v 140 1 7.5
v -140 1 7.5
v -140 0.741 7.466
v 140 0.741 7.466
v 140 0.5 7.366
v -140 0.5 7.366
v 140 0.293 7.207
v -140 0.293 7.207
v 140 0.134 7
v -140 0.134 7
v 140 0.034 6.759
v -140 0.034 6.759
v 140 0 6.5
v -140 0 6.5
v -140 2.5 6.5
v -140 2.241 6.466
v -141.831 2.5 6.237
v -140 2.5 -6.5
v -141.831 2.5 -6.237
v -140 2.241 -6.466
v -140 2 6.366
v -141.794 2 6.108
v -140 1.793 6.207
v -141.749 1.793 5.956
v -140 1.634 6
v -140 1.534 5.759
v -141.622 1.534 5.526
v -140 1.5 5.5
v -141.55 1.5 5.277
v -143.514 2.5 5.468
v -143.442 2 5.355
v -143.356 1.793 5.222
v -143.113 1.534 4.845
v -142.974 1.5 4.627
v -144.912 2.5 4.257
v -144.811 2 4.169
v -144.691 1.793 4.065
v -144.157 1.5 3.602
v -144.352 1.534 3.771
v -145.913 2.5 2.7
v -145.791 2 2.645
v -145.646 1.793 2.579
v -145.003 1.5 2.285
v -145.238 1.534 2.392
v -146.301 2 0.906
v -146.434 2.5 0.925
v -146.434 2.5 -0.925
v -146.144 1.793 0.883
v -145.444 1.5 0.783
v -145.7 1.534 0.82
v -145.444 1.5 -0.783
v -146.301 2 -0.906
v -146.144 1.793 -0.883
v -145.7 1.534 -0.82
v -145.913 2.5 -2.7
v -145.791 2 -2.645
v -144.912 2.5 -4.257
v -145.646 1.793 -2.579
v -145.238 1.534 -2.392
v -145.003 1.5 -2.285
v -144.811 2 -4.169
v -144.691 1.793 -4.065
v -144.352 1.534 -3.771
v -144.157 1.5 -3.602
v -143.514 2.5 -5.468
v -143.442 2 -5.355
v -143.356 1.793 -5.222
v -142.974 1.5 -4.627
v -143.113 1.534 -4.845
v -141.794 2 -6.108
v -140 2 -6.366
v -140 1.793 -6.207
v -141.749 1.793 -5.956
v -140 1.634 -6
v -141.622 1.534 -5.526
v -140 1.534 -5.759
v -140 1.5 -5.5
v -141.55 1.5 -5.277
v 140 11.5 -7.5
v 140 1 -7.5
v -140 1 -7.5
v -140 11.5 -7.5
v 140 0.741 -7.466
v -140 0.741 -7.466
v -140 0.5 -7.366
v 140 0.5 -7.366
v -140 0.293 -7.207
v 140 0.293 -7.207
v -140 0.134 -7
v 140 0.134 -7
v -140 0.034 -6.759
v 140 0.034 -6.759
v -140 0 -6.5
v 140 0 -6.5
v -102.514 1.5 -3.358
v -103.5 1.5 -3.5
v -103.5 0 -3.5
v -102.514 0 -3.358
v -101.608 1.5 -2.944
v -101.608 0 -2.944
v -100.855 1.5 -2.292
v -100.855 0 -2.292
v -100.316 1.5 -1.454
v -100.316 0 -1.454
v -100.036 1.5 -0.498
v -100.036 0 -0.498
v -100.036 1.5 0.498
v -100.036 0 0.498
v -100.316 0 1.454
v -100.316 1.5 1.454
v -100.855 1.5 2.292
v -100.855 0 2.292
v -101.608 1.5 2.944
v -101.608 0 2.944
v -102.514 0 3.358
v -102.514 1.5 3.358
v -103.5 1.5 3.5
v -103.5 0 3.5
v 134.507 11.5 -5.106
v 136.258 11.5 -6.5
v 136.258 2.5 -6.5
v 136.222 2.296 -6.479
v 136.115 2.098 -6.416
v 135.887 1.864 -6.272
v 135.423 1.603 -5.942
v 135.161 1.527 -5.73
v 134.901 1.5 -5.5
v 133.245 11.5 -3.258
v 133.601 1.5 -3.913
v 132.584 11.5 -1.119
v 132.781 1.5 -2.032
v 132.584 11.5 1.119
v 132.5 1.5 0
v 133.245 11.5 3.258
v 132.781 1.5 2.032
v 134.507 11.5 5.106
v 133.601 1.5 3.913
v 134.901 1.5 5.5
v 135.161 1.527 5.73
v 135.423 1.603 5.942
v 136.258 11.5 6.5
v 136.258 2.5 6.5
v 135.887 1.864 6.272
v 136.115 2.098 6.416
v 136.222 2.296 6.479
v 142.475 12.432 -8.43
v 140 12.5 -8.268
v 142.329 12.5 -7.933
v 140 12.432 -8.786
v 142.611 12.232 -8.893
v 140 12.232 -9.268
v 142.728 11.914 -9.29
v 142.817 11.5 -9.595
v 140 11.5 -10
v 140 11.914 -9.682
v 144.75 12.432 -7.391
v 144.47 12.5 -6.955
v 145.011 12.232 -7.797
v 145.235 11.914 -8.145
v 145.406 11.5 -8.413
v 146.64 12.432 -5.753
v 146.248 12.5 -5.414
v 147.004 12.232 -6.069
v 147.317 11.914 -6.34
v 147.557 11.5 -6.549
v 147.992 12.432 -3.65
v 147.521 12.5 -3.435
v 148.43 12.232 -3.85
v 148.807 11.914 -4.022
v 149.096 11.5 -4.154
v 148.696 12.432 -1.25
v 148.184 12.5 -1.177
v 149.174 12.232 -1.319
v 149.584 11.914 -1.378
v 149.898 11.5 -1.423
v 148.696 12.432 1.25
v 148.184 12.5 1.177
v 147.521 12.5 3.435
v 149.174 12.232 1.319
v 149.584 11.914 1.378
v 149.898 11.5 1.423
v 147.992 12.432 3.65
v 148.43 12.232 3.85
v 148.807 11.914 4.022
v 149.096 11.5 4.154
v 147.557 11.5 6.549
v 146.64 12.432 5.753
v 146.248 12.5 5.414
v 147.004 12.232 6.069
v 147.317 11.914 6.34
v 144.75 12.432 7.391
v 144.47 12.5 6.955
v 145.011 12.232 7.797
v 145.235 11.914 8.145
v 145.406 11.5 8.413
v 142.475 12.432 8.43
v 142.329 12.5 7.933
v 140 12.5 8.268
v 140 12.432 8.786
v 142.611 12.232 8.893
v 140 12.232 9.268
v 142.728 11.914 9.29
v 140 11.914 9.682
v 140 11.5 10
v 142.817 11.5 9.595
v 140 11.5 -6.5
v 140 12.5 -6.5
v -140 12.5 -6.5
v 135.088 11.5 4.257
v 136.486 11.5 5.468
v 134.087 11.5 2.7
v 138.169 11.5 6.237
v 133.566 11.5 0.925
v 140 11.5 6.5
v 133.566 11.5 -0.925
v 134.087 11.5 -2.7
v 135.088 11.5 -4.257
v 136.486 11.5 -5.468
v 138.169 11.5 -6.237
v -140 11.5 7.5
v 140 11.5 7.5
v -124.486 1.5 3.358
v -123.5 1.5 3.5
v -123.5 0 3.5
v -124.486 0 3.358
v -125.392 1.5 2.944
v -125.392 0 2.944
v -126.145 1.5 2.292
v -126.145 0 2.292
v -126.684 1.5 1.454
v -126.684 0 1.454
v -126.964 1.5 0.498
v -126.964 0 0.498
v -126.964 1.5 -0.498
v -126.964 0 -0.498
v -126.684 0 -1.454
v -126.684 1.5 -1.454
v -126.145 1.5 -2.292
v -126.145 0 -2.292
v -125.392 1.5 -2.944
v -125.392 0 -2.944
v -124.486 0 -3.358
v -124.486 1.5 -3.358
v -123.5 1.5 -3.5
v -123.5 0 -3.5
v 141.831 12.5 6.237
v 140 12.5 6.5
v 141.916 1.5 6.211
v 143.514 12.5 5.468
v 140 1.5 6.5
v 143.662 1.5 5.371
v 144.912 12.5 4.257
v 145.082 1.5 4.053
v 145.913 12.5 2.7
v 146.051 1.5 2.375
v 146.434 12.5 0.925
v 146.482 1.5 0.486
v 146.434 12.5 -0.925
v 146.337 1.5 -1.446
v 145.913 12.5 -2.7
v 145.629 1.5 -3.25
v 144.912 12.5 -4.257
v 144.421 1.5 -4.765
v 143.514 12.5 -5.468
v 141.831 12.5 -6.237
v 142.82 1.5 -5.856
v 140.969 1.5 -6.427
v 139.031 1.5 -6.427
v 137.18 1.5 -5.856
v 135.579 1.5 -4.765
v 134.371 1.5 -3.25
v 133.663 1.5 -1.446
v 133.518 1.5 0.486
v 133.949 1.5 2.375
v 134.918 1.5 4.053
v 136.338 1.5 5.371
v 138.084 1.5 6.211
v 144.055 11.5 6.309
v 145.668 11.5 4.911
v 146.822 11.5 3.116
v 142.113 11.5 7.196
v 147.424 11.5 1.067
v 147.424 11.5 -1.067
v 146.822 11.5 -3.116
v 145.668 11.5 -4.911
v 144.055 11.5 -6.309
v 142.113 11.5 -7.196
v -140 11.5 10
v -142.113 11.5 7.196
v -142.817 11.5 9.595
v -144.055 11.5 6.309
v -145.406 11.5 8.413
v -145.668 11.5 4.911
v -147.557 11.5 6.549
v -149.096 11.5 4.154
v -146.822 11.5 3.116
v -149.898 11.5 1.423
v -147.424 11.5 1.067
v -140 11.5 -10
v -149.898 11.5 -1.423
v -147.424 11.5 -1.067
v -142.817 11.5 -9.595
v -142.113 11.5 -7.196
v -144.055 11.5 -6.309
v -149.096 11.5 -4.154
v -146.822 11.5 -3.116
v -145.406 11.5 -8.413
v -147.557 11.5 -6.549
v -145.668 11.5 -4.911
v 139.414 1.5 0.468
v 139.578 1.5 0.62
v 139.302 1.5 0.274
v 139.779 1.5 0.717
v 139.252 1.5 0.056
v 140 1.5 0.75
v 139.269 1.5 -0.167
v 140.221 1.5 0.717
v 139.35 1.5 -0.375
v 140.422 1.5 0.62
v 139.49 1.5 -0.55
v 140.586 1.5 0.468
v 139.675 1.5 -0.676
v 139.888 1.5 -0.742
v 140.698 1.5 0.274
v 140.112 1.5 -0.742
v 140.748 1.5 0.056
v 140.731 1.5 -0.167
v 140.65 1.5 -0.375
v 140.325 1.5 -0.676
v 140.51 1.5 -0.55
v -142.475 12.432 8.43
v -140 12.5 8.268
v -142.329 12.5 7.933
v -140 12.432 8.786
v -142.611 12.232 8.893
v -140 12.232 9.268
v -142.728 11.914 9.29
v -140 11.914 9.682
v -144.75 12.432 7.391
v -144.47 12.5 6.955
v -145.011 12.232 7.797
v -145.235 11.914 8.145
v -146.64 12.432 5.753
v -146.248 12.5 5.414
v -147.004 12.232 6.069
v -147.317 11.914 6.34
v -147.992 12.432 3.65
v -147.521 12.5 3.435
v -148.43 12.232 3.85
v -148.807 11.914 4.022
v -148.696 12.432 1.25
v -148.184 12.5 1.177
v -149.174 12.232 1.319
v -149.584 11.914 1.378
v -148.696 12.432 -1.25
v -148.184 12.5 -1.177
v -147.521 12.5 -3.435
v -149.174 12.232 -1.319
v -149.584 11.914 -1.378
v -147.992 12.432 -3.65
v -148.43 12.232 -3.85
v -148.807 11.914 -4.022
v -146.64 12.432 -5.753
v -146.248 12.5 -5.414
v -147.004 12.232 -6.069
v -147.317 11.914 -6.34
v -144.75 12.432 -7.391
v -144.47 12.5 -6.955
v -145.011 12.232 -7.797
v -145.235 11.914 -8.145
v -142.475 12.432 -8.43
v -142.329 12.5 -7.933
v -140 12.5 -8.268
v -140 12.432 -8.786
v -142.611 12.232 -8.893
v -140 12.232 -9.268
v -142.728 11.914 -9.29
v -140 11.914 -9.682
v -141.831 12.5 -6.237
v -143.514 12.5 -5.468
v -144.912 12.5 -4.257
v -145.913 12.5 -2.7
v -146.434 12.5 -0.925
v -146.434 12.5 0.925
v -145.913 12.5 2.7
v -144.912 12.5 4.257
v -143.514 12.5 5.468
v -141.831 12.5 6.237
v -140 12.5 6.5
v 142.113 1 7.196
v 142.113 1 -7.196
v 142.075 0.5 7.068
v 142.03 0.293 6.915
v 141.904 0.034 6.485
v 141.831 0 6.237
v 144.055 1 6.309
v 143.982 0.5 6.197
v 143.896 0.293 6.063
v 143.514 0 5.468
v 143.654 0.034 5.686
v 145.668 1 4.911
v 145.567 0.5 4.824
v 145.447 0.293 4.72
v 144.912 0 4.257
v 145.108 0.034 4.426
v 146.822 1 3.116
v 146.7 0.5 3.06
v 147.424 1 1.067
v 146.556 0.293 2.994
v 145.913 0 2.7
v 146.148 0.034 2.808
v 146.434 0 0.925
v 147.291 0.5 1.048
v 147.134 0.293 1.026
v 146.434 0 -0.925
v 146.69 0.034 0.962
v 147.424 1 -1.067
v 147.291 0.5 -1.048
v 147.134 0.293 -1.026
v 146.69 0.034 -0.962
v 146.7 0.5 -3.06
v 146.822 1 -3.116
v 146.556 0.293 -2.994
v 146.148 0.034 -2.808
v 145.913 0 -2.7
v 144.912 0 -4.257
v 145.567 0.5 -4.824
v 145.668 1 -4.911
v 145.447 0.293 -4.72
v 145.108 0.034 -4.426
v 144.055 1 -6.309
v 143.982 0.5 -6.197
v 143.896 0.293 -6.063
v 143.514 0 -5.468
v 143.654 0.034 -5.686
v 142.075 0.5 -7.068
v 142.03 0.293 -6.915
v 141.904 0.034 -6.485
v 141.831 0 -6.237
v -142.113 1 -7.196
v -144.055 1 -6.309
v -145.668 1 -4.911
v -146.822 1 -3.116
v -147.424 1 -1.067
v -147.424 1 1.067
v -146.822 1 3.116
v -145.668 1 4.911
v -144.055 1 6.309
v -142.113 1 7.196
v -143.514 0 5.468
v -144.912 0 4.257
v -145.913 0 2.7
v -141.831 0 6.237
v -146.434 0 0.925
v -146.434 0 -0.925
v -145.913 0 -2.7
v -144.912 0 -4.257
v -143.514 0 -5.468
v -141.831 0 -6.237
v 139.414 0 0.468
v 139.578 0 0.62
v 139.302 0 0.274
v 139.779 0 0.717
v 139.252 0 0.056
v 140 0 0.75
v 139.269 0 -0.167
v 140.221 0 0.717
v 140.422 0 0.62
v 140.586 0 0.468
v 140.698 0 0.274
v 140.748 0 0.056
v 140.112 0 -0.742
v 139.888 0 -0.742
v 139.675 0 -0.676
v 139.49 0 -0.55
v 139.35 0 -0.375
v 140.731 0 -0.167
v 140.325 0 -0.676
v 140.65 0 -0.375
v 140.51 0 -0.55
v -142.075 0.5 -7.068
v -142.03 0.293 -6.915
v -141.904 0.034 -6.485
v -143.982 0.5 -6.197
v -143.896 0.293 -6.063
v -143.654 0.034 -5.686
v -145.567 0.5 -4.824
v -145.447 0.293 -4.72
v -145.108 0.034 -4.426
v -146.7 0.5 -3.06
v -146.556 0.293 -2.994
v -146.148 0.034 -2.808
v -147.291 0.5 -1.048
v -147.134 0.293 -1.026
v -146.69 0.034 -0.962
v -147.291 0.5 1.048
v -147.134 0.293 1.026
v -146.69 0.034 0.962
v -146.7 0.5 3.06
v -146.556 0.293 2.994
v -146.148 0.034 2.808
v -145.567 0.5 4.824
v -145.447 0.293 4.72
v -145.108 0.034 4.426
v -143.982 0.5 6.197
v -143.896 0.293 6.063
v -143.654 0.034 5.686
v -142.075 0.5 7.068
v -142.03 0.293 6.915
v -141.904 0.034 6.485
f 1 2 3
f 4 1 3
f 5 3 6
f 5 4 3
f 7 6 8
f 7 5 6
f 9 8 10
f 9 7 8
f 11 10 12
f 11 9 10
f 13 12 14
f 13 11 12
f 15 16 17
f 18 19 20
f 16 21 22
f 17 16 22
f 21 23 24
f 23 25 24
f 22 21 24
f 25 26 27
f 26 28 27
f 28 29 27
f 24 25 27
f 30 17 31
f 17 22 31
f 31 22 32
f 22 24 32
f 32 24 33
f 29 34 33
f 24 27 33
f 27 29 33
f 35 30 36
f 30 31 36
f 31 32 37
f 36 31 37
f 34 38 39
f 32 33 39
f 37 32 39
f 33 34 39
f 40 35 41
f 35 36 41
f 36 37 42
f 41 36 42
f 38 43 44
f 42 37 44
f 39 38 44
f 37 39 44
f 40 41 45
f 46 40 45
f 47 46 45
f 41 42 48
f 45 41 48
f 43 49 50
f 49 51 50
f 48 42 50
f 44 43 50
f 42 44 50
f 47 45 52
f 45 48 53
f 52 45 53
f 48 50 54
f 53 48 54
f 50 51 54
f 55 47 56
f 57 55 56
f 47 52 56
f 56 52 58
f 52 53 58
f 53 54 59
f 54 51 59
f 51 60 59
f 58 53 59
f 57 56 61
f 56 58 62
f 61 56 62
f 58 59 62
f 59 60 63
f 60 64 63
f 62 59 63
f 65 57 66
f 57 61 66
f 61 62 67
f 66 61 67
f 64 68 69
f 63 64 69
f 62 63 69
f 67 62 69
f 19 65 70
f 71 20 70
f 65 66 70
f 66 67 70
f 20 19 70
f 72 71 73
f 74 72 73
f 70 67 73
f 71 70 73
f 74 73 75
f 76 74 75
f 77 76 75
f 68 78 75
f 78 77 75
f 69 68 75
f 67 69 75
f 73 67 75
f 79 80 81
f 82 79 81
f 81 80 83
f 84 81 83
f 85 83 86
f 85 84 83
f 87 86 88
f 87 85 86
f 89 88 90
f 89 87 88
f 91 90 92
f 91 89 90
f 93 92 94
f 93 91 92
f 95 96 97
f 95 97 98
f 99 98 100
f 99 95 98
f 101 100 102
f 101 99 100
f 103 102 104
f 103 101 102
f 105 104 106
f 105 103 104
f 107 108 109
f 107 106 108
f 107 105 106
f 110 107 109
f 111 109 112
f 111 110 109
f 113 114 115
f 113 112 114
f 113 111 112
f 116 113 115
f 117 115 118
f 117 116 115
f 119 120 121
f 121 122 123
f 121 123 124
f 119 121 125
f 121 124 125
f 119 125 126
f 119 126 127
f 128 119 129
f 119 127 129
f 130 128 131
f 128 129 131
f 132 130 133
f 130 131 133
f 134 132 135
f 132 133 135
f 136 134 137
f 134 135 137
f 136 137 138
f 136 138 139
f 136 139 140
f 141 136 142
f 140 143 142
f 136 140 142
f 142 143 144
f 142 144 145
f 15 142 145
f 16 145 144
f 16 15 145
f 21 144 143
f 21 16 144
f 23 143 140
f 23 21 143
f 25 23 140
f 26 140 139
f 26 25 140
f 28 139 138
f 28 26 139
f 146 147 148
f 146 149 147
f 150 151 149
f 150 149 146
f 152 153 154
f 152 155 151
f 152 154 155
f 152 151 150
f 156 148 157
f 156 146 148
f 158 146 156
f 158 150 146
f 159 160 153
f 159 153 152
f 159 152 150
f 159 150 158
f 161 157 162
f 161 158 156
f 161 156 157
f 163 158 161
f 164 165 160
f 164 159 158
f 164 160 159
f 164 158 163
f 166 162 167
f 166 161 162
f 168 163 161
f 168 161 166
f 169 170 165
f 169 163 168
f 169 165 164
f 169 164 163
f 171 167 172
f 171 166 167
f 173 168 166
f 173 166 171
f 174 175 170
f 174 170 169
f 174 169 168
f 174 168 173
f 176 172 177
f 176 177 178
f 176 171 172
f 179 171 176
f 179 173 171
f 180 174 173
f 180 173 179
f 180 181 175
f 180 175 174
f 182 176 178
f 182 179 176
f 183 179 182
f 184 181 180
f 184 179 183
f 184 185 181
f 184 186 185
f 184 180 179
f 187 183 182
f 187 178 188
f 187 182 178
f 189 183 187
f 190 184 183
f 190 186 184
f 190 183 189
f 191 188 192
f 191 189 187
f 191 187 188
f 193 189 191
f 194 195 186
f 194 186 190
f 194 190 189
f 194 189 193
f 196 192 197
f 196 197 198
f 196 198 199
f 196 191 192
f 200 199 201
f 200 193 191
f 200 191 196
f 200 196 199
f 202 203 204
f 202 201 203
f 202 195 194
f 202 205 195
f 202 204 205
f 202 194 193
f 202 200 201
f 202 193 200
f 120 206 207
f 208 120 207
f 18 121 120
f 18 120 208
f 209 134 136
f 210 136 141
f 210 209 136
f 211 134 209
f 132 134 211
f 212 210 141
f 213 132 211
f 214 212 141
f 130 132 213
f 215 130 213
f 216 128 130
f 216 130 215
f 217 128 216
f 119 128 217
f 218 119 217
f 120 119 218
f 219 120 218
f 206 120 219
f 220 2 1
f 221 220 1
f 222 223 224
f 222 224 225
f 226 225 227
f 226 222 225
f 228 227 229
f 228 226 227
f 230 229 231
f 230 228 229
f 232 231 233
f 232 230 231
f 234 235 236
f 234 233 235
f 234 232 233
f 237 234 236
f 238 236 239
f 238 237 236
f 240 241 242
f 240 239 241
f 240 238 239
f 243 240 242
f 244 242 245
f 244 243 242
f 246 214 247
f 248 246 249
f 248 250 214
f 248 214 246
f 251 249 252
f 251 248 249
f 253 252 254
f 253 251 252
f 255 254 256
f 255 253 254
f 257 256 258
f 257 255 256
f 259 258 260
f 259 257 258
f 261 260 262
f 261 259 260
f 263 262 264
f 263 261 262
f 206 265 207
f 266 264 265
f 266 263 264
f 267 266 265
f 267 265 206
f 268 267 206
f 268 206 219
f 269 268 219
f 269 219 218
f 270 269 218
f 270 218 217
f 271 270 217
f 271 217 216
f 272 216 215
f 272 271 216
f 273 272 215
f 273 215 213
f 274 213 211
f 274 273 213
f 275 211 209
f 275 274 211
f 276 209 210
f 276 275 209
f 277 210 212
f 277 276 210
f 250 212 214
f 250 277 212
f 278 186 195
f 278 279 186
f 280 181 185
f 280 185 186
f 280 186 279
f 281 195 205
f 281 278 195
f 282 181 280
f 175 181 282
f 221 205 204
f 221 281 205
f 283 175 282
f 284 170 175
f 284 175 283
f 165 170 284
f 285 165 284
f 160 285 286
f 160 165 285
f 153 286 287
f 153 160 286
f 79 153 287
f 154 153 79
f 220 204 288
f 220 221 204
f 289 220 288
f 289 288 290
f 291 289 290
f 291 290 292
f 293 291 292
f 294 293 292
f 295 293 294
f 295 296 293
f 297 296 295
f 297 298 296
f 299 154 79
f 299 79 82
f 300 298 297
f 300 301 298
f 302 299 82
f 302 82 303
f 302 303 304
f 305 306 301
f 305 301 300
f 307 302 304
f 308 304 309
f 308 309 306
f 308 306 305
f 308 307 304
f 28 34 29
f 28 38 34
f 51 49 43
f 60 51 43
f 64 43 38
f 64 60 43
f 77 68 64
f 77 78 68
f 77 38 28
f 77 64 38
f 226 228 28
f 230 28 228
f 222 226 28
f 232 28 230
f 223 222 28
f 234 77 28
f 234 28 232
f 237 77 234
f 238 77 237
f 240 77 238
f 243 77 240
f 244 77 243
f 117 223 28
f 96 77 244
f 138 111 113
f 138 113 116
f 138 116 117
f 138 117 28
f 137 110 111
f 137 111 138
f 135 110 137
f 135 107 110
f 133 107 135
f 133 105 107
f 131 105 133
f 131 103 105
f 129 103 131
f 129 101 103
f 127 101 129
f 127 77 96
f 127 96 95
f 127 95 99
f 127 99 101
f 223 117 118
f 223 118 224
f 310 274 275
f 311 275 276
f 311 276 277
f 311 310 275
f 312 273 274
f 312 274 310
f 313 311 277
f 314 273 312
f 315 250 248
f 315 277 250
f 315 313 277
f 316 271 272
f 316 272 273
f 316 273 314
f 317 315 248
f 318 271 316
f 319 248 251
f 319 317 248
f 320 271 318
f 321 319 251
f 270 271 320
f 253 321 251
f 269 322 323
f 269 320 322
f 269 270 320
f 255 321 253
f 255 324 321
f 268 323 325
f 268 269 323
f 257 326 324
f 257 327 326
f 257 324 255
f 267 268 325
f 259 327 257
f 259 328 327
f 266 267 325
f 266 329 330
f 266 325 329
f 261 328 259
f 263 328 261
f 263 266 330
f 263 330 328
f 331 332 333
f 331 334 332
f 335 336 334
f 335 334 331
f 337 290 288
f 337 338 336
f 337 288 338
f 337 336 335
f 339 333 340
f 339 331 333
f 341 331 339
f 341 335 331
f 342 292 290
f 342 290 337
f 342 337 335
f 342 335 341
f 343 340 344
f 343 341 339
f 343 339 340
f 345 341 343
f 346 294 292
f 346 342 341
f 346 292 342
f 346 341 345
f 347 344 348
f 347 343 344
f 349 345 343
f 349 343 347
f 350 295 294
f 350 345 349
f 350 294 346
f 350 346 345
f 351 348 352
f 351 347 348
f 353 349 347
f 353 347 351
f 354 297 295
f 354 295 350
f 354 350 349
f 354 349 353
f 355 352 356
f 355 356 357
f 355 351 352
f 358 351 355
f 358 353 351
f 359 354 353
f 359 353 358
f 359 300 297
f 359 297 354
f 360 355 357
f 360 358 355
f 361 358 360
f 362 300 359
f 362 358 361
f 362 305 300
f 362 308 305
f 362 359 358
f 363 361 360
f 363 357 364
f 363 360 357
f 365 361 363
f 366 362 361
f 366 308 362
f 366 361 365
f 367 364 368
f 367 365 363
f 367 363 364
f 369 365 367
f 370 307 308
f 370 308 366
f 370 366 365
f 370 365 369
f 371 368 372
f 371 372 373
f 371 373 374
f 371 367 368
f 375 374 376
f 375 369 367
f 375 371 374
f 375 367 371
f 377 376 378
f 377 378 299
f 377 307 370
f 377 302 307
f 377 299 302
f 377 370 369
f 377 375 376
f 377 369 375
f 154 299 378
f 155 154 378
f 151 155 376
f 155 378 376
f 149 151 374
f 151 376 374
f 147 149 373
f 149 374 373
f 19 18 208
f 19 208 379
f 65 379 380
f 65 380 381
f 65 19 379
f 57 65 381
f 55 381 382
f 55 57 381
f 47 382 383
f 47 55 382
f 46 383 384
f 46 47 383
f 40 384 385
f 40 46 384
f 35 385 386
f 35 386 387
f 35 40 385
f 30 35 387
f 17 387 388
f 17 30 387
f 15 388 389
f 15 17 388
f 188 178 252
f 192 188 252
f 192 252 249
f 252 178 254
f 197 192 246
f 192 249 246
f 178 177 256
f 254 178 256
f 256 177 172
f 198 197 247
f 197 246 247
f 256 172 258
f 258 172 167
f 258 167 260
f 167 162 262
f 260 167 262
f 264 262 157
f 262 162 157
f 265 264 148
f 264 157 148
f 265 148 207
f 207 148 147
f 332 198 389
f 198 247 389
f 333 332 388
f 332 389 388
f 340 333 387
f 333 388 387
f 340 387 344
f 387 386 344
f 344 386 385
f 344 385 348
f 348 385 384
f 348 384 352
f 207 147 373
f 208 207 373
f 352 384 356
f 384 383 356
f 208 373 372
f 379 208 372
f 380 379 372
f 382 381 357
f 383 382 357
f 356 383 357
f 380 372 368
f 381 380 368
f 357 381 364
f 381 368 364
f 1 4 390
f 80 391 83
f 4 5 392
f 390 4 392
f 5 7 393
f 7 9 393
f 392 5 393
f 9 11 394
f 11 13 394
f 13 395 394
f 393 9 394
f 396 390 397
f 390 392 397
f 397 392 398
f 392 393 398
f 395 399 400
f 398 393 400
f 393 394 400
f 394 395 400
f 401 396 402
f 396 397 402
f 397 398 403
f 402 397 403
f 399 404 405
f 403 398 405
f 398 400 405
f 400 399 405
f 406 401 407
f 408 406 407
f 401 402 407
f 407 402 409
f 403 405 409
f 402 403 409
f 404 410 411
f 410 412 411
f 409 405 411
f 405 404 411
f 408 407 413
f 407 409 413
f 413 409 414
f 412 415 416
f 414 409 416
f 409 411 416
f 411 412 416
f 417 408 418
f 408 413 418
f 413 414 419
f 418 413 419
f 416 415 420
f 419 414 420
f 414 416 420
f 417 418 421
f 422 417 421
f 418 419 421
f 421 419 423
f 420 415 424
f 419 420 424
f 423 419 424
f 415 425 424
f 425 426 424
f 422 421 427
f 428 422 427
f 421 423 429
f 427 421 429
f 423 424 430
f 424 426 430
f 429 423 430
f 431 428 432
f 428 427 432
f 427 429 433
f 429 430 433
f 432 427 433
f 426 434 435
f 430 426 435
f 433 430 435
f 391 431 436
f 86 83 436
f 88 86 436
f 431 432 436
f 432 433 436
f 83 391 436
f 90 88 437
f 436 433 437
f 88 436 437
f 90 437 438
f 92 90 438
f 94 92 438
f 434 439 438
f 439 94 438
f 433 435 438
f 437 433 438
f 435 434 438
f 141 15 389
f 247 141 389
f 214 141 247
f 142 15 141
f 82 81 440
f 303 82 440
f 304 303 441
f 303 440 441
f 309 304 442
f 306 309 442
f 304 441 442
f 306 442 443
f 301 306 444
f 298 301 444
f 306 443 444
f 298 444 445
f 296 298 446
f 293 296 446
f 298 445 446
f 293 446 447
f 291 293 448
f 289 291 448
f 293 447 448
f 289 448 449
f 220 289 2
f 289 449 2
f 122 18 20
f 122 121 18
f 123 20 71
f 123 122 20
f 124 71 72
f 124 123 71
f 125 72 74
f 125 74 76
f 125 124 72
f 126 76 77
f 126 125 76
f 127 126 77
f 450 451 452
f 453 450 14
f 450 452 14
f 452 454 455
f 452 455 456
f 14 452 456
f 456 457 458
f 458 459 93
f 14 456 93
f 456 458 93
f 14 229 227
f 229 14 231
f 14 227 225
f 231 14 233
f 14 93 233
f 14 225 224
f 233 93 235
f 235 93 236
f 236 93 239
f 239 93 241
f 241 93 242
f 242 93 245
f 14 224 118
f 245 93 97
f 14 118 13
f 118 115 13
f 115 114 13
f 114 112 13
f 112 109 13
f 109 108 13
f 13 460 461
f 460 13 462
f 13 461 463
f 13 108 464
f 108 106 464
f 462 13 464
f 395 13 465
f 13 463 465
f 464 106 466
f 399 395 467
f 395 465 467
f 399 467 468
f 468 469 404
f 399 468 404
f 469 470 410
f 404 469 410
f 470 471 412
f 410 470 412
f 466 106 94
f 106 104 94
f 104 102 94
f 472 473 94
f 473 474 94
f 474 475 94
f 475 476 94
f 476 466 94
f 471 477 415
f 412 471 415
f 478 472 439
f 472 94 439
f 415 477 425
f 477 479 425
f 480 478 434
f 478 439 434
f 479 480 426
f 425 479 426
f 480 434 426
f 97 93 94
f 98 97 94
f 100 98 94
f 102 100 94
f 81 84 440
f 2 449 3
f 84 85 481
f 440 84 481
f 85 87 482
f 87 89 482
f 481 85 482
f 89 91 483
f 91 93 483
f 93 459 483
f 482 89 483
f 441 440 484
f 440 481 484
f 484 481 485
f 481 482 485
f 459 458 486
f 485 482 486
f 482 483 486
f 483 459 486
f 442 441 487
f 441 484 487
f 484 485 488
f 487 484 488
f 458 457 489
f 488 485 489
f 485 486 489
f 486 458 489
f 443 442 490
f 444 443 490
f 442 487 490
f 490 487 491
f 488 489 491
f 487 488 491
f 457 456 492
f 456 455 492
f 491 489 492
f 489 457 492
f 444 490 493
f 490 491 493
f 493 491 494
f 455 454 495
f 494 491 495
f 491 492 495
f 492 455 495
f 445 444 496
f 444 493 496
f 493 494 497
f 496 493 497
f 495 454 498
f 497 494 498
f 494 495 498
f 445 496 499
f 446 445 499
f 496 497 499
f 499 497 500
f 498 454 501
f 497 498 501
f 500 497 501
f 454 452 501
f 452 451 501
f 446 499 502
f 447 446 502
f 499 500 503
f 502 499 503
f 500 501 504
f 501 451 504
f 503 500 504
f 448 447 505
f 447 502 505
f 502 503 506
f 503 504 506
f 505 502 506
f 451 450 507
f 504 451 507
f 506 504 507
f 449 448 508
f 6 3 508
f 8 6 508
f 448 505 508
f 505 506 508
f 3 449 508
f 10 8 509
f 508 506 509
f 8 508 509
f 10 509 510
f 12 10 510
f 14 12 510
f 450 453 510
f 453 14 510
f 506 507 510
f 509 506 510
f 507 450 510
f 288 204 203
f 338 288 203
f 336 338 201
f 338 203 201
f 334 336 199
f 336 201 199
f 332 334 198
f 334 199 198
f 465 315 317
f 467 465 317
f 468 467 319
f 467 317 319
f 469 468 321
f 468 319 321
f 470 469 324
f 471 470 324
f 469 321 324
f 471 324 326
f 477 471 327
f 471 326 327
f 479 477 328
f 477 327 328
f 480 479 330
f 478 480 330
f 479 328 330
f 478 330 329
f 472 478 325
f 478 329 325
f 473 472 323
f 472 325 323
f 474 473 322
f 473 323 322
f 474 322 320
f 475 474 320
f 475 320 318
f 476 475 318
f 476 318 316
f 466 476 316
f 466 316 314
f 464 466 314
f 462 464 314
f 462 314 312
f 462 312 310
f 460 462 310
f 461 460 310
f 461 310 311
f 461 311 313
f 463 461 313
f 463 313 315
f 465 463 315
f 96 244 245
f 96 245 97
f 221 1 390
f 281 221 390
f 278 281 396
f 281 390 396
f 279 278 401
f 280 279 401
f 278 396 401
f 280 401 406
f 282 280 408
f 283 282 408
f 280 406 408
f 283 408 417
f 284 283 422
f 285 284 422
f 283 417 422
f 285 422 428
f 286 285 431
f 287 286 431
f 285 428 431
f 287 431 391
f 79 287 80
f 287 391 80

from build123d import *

# Parameters (mm, degrees)
BOSS_EXTRUDE1_DEPTH = 1.5
SKETCH2_R           = 6.5
BOSS_EXTRUDE2_DEPTH = 10
BOSS_EXTRUDE3_DEPTH = 1
FILLET1_R           = 2
FILLET2_R           = 1
FILLET3_R           = 1
CUT_EXTRUDE1_DEPTH  = 151.73486657
SKETCH5_R           = 0.75
CUT_EXTRUDE2_DEPTH  = 151.73486657


with BuildPart() as part:
    # Sketch1 → Boss-Extrude1 (new body)
    with BuildSketch(Plane(origin=(0, 0, 0), x_dir=(1, 0, 0), z_dir=(0, 1, 0))):
        with BuildLine():
            Line((140, 7.5), (-140, 7.5))
            ThreePointArc((-140, 7.5), (-147.5, 0), (-140, -7.5))
            Line((-140, -7.5), (140, -7.5))
            ThreePointArc((140, -7.5), (147.5, 0), (140, 7.5))
        make_face()
    extrude(amount=BOSS_EXTRUDE1_DEPTH)

    # Sketch2 → Boss-Extrude2 (add)
    with BuildSketch(Plane(origin=(0, 1.5, 0), x_dir=(1, 0, 0), z_dir=(0, 1, 0))):
        with BuildLine():
            Line((-140, -7.5), (140, -7.5))
            ThreePointArc((140, -7.5), (147.5, 0), (140, 7.5))
            Line((140, 7.5), (-140, 7.5))
            ThreePointArc((-140, 7.5), (-147.5, 0), (-140, -7.5))
        make_face()
        with Locations(Location((140, 0, 0), (0, 0, 270))):
            Circle(SKETCH2_R, mode=Mode.SUBTRACT)
        with BuildLine():
            Line((-140, 6.5), (136.258342613, 6.5))
            ThreePointArc((136.258342613, 6.5), (132.5, 0), (136.258342613, -6.5))
            Line((136.258342613, -6.5), (-140, -6.5))
            ThreePointArc((-140, -6.5), (-146.5, 0), (-140, 6.5))
        make_face(mode=Mode.SUBTRACT)
    extrude(amount=BOSS_EXTRUDE2_DEPTH)

    # Sketch3 → Boss-Extrude3 (add)
    with BuildSketch(Plane(origin=(0, 11.5, 0), x_dir=(1, 0, 0), z_dir=(0, 1, 0))):
        with BuildLine():
            Line((-140, 10), (140, 10))
            ThreePointArc((140, 10), (150, 0), (140, -10))
            Line((140, -10), (-140, -10))
            ThreePointArc((-140, -10), (-150, 0), (-140, 10))
        make_face()
        with BuildLine():
            Line((-140, -6.5), (136.258342613, -6.5))
            Line((136.258342613, -6.5), (140, -6.5))
            ThreePointArc((140, -6.5), (146.5, 0), (140, 6.5))
            Line((140, 6.5), (136.258342613, 6.5))
            Line((136.258342613, 6.5), (-140, 6.5))
            ThreePointArc((-140, 6.5), (-146.5, 0), (-140, -6.5))
        make_face(mode=Mode.SUBTRACT)
    extrude(amount=BOSS_EXTRUDE3_DEPTH)

    # Fillet1
    # the kernel refuses this fillet: 2 mm, written as the material it takes off along each edge
    with BuildSketch(Plane(origin=(-140, 12.5, 0), x_dir=(0, 0, 1), z_dir=(1, 0, 0))) as fillet1_piece_1:
        with BuildLine():
            CenterArc((8.267949192, 2), FILLET1_R, 270, 60)
            Line((10, 1), (10.034641016, 0.98))
            ThreePointArc((10.034641016, 0.98), (10.04, 0.5), (10.04, 0))
            Line((10.04, 0), (10, -0.04))
            Line((10, -0.04), (8.267949192, -0.04))
            Line((8.267949192, -0.04), (8.267949192, 0))
        make_face()
    revolve(axis=Axis((-140, 12.5, 0), (0, -1, 0)), revolution_arc=180, mode=Mode.SUBTRACT)
    with BuildSketch(Plane(origin=(140, 12.5, 10), x_dir=(0, -1, 0), z_dir=(-1, 0, 0))) as fillet1_piece_2:
        with BuildLine():
            CenterArc((2, -1.732050808), FILLET1_R, 120, 60)
            Line((0, -1.732050808), (-0.04, -1.732050808))
            Line((-0.04, -1.732050808), (-0.04, 0))
            Line((-0.04, 0), (0, 0.04))
            ThreePointArc((0, 0.04), (0.5, 0.04), (0.98, 0.034641016))
            Line((0.98, 0.034641016), (1, 0))
        make_face()
    extrude(amount=280, mode=Mode.SUBTRACT)
    with BuildSketch(Plane(origin=(140, 12.5, 0), x_dir=(0, 0, -1), z_dir=(-1, 0, 0))) as fillet1_piece_3:
        with BuildLine():
            CenterArc((8.267949192, 2), FILLET1_R, 270, 60)
            Line((10, 1), (10.034641016, 0.98))
            ThreePointArc((10.034641016, 0.98), (10.04, 0.5), (10.04, 0))
            Line((10.04, 0), (10, -0.04))
            Line((10, -0.04), (8.267949192, -0.04))
            Line((8.267949192, -0.04), (8.267949192, 0))
        make_face()
    revolve(axis=Axis((140, 12.5, 0), (0, -1, 0)), revolution_arc=180, mode=Mode.SUBTRACT)
    with BuildSketch(Plane(origin=(-140, 12.5, -10), x_dir=(0, 0, 1), z_dir=(1, 0, 0))) as fillet1_piece_4:
        with BuildLine():
            CenterArc((1.732050808, 2), FILLET1_R, 210, 60)
            Line((0, 1), (-0.034641016, 0.98))
            ThreePointArc((-0.034641016, 0.98), (-0.04, 0.5), (-0.04, 0))
            Line((-0.04, 0), (0, -0.04))
            Line((0, -0.04), (1.732050808, -0.04))
            Line((1.732050808, -0.04), (1.732050808, 0))
        make_face()
    extrude(amount=280, mode=Mode.SUBTRACT)

    # Fillet2
    fillet2_edges = [part.edges().sort_by_distance(p)[0] for p in [
        (0, 0, -7.5),
        (147.5, 0, 0),
        (0, 0, 7.5),
        (-147.5, 0, 0),
    ]]
    fillet(fillet2_edges, radius=FILLET2_R)

    # Fillet3
    fillet3_edges = [part.edges().sort_by_distance(p)[0] for p in [
        (-146.5, 1.5, 0),
        (-1.870828693, 1.5, 6.5),
        (-1.870828693, 1.5, -6.5),
    ]]
    fillet(fillet3_edges, radius=FILLET3_R)

    # Sketch4 → Cut-Extrude1 (cut, through all)
    with BuildSketch(Plane(origin=(0, 1.5, 0), x_dir=(1, 0, 0), z_dir=(0, 1, 0))):
        with BuildLine():
            Line((-123.5, 3.5), (-103.5, 3.5))
            ThreePointArc((-103.5, 3.5), (-100, 0), (-103.5, -3.5))
            Line((-103.5, -3.5), (-123.5, -3.5))
            ThreePointArc((-123.5, -3.5), (-127, 0), (-123.5, 3.5))
        make_face()
    extrude(amount=-CUT_EXTRUDE1_DEPTH, mode=Mode.SUBTRACT)

    # Sketch5 → Cut-Extrude2 (cut, through all)
    with BuildSketch(Plane(origin=(0, 1.5, 0), x_dir=(1, 0, 0), z_dir=(0, 1, 0))):
        with Locations(Location((140, 0, 0), (0, 0, 270))):
            Circle(SKETCH5_R)
    extrude(amount=-CUT_EXTRUDE2_DEPTH, mode=Mode.SUBTRACT)


solid = part.part
